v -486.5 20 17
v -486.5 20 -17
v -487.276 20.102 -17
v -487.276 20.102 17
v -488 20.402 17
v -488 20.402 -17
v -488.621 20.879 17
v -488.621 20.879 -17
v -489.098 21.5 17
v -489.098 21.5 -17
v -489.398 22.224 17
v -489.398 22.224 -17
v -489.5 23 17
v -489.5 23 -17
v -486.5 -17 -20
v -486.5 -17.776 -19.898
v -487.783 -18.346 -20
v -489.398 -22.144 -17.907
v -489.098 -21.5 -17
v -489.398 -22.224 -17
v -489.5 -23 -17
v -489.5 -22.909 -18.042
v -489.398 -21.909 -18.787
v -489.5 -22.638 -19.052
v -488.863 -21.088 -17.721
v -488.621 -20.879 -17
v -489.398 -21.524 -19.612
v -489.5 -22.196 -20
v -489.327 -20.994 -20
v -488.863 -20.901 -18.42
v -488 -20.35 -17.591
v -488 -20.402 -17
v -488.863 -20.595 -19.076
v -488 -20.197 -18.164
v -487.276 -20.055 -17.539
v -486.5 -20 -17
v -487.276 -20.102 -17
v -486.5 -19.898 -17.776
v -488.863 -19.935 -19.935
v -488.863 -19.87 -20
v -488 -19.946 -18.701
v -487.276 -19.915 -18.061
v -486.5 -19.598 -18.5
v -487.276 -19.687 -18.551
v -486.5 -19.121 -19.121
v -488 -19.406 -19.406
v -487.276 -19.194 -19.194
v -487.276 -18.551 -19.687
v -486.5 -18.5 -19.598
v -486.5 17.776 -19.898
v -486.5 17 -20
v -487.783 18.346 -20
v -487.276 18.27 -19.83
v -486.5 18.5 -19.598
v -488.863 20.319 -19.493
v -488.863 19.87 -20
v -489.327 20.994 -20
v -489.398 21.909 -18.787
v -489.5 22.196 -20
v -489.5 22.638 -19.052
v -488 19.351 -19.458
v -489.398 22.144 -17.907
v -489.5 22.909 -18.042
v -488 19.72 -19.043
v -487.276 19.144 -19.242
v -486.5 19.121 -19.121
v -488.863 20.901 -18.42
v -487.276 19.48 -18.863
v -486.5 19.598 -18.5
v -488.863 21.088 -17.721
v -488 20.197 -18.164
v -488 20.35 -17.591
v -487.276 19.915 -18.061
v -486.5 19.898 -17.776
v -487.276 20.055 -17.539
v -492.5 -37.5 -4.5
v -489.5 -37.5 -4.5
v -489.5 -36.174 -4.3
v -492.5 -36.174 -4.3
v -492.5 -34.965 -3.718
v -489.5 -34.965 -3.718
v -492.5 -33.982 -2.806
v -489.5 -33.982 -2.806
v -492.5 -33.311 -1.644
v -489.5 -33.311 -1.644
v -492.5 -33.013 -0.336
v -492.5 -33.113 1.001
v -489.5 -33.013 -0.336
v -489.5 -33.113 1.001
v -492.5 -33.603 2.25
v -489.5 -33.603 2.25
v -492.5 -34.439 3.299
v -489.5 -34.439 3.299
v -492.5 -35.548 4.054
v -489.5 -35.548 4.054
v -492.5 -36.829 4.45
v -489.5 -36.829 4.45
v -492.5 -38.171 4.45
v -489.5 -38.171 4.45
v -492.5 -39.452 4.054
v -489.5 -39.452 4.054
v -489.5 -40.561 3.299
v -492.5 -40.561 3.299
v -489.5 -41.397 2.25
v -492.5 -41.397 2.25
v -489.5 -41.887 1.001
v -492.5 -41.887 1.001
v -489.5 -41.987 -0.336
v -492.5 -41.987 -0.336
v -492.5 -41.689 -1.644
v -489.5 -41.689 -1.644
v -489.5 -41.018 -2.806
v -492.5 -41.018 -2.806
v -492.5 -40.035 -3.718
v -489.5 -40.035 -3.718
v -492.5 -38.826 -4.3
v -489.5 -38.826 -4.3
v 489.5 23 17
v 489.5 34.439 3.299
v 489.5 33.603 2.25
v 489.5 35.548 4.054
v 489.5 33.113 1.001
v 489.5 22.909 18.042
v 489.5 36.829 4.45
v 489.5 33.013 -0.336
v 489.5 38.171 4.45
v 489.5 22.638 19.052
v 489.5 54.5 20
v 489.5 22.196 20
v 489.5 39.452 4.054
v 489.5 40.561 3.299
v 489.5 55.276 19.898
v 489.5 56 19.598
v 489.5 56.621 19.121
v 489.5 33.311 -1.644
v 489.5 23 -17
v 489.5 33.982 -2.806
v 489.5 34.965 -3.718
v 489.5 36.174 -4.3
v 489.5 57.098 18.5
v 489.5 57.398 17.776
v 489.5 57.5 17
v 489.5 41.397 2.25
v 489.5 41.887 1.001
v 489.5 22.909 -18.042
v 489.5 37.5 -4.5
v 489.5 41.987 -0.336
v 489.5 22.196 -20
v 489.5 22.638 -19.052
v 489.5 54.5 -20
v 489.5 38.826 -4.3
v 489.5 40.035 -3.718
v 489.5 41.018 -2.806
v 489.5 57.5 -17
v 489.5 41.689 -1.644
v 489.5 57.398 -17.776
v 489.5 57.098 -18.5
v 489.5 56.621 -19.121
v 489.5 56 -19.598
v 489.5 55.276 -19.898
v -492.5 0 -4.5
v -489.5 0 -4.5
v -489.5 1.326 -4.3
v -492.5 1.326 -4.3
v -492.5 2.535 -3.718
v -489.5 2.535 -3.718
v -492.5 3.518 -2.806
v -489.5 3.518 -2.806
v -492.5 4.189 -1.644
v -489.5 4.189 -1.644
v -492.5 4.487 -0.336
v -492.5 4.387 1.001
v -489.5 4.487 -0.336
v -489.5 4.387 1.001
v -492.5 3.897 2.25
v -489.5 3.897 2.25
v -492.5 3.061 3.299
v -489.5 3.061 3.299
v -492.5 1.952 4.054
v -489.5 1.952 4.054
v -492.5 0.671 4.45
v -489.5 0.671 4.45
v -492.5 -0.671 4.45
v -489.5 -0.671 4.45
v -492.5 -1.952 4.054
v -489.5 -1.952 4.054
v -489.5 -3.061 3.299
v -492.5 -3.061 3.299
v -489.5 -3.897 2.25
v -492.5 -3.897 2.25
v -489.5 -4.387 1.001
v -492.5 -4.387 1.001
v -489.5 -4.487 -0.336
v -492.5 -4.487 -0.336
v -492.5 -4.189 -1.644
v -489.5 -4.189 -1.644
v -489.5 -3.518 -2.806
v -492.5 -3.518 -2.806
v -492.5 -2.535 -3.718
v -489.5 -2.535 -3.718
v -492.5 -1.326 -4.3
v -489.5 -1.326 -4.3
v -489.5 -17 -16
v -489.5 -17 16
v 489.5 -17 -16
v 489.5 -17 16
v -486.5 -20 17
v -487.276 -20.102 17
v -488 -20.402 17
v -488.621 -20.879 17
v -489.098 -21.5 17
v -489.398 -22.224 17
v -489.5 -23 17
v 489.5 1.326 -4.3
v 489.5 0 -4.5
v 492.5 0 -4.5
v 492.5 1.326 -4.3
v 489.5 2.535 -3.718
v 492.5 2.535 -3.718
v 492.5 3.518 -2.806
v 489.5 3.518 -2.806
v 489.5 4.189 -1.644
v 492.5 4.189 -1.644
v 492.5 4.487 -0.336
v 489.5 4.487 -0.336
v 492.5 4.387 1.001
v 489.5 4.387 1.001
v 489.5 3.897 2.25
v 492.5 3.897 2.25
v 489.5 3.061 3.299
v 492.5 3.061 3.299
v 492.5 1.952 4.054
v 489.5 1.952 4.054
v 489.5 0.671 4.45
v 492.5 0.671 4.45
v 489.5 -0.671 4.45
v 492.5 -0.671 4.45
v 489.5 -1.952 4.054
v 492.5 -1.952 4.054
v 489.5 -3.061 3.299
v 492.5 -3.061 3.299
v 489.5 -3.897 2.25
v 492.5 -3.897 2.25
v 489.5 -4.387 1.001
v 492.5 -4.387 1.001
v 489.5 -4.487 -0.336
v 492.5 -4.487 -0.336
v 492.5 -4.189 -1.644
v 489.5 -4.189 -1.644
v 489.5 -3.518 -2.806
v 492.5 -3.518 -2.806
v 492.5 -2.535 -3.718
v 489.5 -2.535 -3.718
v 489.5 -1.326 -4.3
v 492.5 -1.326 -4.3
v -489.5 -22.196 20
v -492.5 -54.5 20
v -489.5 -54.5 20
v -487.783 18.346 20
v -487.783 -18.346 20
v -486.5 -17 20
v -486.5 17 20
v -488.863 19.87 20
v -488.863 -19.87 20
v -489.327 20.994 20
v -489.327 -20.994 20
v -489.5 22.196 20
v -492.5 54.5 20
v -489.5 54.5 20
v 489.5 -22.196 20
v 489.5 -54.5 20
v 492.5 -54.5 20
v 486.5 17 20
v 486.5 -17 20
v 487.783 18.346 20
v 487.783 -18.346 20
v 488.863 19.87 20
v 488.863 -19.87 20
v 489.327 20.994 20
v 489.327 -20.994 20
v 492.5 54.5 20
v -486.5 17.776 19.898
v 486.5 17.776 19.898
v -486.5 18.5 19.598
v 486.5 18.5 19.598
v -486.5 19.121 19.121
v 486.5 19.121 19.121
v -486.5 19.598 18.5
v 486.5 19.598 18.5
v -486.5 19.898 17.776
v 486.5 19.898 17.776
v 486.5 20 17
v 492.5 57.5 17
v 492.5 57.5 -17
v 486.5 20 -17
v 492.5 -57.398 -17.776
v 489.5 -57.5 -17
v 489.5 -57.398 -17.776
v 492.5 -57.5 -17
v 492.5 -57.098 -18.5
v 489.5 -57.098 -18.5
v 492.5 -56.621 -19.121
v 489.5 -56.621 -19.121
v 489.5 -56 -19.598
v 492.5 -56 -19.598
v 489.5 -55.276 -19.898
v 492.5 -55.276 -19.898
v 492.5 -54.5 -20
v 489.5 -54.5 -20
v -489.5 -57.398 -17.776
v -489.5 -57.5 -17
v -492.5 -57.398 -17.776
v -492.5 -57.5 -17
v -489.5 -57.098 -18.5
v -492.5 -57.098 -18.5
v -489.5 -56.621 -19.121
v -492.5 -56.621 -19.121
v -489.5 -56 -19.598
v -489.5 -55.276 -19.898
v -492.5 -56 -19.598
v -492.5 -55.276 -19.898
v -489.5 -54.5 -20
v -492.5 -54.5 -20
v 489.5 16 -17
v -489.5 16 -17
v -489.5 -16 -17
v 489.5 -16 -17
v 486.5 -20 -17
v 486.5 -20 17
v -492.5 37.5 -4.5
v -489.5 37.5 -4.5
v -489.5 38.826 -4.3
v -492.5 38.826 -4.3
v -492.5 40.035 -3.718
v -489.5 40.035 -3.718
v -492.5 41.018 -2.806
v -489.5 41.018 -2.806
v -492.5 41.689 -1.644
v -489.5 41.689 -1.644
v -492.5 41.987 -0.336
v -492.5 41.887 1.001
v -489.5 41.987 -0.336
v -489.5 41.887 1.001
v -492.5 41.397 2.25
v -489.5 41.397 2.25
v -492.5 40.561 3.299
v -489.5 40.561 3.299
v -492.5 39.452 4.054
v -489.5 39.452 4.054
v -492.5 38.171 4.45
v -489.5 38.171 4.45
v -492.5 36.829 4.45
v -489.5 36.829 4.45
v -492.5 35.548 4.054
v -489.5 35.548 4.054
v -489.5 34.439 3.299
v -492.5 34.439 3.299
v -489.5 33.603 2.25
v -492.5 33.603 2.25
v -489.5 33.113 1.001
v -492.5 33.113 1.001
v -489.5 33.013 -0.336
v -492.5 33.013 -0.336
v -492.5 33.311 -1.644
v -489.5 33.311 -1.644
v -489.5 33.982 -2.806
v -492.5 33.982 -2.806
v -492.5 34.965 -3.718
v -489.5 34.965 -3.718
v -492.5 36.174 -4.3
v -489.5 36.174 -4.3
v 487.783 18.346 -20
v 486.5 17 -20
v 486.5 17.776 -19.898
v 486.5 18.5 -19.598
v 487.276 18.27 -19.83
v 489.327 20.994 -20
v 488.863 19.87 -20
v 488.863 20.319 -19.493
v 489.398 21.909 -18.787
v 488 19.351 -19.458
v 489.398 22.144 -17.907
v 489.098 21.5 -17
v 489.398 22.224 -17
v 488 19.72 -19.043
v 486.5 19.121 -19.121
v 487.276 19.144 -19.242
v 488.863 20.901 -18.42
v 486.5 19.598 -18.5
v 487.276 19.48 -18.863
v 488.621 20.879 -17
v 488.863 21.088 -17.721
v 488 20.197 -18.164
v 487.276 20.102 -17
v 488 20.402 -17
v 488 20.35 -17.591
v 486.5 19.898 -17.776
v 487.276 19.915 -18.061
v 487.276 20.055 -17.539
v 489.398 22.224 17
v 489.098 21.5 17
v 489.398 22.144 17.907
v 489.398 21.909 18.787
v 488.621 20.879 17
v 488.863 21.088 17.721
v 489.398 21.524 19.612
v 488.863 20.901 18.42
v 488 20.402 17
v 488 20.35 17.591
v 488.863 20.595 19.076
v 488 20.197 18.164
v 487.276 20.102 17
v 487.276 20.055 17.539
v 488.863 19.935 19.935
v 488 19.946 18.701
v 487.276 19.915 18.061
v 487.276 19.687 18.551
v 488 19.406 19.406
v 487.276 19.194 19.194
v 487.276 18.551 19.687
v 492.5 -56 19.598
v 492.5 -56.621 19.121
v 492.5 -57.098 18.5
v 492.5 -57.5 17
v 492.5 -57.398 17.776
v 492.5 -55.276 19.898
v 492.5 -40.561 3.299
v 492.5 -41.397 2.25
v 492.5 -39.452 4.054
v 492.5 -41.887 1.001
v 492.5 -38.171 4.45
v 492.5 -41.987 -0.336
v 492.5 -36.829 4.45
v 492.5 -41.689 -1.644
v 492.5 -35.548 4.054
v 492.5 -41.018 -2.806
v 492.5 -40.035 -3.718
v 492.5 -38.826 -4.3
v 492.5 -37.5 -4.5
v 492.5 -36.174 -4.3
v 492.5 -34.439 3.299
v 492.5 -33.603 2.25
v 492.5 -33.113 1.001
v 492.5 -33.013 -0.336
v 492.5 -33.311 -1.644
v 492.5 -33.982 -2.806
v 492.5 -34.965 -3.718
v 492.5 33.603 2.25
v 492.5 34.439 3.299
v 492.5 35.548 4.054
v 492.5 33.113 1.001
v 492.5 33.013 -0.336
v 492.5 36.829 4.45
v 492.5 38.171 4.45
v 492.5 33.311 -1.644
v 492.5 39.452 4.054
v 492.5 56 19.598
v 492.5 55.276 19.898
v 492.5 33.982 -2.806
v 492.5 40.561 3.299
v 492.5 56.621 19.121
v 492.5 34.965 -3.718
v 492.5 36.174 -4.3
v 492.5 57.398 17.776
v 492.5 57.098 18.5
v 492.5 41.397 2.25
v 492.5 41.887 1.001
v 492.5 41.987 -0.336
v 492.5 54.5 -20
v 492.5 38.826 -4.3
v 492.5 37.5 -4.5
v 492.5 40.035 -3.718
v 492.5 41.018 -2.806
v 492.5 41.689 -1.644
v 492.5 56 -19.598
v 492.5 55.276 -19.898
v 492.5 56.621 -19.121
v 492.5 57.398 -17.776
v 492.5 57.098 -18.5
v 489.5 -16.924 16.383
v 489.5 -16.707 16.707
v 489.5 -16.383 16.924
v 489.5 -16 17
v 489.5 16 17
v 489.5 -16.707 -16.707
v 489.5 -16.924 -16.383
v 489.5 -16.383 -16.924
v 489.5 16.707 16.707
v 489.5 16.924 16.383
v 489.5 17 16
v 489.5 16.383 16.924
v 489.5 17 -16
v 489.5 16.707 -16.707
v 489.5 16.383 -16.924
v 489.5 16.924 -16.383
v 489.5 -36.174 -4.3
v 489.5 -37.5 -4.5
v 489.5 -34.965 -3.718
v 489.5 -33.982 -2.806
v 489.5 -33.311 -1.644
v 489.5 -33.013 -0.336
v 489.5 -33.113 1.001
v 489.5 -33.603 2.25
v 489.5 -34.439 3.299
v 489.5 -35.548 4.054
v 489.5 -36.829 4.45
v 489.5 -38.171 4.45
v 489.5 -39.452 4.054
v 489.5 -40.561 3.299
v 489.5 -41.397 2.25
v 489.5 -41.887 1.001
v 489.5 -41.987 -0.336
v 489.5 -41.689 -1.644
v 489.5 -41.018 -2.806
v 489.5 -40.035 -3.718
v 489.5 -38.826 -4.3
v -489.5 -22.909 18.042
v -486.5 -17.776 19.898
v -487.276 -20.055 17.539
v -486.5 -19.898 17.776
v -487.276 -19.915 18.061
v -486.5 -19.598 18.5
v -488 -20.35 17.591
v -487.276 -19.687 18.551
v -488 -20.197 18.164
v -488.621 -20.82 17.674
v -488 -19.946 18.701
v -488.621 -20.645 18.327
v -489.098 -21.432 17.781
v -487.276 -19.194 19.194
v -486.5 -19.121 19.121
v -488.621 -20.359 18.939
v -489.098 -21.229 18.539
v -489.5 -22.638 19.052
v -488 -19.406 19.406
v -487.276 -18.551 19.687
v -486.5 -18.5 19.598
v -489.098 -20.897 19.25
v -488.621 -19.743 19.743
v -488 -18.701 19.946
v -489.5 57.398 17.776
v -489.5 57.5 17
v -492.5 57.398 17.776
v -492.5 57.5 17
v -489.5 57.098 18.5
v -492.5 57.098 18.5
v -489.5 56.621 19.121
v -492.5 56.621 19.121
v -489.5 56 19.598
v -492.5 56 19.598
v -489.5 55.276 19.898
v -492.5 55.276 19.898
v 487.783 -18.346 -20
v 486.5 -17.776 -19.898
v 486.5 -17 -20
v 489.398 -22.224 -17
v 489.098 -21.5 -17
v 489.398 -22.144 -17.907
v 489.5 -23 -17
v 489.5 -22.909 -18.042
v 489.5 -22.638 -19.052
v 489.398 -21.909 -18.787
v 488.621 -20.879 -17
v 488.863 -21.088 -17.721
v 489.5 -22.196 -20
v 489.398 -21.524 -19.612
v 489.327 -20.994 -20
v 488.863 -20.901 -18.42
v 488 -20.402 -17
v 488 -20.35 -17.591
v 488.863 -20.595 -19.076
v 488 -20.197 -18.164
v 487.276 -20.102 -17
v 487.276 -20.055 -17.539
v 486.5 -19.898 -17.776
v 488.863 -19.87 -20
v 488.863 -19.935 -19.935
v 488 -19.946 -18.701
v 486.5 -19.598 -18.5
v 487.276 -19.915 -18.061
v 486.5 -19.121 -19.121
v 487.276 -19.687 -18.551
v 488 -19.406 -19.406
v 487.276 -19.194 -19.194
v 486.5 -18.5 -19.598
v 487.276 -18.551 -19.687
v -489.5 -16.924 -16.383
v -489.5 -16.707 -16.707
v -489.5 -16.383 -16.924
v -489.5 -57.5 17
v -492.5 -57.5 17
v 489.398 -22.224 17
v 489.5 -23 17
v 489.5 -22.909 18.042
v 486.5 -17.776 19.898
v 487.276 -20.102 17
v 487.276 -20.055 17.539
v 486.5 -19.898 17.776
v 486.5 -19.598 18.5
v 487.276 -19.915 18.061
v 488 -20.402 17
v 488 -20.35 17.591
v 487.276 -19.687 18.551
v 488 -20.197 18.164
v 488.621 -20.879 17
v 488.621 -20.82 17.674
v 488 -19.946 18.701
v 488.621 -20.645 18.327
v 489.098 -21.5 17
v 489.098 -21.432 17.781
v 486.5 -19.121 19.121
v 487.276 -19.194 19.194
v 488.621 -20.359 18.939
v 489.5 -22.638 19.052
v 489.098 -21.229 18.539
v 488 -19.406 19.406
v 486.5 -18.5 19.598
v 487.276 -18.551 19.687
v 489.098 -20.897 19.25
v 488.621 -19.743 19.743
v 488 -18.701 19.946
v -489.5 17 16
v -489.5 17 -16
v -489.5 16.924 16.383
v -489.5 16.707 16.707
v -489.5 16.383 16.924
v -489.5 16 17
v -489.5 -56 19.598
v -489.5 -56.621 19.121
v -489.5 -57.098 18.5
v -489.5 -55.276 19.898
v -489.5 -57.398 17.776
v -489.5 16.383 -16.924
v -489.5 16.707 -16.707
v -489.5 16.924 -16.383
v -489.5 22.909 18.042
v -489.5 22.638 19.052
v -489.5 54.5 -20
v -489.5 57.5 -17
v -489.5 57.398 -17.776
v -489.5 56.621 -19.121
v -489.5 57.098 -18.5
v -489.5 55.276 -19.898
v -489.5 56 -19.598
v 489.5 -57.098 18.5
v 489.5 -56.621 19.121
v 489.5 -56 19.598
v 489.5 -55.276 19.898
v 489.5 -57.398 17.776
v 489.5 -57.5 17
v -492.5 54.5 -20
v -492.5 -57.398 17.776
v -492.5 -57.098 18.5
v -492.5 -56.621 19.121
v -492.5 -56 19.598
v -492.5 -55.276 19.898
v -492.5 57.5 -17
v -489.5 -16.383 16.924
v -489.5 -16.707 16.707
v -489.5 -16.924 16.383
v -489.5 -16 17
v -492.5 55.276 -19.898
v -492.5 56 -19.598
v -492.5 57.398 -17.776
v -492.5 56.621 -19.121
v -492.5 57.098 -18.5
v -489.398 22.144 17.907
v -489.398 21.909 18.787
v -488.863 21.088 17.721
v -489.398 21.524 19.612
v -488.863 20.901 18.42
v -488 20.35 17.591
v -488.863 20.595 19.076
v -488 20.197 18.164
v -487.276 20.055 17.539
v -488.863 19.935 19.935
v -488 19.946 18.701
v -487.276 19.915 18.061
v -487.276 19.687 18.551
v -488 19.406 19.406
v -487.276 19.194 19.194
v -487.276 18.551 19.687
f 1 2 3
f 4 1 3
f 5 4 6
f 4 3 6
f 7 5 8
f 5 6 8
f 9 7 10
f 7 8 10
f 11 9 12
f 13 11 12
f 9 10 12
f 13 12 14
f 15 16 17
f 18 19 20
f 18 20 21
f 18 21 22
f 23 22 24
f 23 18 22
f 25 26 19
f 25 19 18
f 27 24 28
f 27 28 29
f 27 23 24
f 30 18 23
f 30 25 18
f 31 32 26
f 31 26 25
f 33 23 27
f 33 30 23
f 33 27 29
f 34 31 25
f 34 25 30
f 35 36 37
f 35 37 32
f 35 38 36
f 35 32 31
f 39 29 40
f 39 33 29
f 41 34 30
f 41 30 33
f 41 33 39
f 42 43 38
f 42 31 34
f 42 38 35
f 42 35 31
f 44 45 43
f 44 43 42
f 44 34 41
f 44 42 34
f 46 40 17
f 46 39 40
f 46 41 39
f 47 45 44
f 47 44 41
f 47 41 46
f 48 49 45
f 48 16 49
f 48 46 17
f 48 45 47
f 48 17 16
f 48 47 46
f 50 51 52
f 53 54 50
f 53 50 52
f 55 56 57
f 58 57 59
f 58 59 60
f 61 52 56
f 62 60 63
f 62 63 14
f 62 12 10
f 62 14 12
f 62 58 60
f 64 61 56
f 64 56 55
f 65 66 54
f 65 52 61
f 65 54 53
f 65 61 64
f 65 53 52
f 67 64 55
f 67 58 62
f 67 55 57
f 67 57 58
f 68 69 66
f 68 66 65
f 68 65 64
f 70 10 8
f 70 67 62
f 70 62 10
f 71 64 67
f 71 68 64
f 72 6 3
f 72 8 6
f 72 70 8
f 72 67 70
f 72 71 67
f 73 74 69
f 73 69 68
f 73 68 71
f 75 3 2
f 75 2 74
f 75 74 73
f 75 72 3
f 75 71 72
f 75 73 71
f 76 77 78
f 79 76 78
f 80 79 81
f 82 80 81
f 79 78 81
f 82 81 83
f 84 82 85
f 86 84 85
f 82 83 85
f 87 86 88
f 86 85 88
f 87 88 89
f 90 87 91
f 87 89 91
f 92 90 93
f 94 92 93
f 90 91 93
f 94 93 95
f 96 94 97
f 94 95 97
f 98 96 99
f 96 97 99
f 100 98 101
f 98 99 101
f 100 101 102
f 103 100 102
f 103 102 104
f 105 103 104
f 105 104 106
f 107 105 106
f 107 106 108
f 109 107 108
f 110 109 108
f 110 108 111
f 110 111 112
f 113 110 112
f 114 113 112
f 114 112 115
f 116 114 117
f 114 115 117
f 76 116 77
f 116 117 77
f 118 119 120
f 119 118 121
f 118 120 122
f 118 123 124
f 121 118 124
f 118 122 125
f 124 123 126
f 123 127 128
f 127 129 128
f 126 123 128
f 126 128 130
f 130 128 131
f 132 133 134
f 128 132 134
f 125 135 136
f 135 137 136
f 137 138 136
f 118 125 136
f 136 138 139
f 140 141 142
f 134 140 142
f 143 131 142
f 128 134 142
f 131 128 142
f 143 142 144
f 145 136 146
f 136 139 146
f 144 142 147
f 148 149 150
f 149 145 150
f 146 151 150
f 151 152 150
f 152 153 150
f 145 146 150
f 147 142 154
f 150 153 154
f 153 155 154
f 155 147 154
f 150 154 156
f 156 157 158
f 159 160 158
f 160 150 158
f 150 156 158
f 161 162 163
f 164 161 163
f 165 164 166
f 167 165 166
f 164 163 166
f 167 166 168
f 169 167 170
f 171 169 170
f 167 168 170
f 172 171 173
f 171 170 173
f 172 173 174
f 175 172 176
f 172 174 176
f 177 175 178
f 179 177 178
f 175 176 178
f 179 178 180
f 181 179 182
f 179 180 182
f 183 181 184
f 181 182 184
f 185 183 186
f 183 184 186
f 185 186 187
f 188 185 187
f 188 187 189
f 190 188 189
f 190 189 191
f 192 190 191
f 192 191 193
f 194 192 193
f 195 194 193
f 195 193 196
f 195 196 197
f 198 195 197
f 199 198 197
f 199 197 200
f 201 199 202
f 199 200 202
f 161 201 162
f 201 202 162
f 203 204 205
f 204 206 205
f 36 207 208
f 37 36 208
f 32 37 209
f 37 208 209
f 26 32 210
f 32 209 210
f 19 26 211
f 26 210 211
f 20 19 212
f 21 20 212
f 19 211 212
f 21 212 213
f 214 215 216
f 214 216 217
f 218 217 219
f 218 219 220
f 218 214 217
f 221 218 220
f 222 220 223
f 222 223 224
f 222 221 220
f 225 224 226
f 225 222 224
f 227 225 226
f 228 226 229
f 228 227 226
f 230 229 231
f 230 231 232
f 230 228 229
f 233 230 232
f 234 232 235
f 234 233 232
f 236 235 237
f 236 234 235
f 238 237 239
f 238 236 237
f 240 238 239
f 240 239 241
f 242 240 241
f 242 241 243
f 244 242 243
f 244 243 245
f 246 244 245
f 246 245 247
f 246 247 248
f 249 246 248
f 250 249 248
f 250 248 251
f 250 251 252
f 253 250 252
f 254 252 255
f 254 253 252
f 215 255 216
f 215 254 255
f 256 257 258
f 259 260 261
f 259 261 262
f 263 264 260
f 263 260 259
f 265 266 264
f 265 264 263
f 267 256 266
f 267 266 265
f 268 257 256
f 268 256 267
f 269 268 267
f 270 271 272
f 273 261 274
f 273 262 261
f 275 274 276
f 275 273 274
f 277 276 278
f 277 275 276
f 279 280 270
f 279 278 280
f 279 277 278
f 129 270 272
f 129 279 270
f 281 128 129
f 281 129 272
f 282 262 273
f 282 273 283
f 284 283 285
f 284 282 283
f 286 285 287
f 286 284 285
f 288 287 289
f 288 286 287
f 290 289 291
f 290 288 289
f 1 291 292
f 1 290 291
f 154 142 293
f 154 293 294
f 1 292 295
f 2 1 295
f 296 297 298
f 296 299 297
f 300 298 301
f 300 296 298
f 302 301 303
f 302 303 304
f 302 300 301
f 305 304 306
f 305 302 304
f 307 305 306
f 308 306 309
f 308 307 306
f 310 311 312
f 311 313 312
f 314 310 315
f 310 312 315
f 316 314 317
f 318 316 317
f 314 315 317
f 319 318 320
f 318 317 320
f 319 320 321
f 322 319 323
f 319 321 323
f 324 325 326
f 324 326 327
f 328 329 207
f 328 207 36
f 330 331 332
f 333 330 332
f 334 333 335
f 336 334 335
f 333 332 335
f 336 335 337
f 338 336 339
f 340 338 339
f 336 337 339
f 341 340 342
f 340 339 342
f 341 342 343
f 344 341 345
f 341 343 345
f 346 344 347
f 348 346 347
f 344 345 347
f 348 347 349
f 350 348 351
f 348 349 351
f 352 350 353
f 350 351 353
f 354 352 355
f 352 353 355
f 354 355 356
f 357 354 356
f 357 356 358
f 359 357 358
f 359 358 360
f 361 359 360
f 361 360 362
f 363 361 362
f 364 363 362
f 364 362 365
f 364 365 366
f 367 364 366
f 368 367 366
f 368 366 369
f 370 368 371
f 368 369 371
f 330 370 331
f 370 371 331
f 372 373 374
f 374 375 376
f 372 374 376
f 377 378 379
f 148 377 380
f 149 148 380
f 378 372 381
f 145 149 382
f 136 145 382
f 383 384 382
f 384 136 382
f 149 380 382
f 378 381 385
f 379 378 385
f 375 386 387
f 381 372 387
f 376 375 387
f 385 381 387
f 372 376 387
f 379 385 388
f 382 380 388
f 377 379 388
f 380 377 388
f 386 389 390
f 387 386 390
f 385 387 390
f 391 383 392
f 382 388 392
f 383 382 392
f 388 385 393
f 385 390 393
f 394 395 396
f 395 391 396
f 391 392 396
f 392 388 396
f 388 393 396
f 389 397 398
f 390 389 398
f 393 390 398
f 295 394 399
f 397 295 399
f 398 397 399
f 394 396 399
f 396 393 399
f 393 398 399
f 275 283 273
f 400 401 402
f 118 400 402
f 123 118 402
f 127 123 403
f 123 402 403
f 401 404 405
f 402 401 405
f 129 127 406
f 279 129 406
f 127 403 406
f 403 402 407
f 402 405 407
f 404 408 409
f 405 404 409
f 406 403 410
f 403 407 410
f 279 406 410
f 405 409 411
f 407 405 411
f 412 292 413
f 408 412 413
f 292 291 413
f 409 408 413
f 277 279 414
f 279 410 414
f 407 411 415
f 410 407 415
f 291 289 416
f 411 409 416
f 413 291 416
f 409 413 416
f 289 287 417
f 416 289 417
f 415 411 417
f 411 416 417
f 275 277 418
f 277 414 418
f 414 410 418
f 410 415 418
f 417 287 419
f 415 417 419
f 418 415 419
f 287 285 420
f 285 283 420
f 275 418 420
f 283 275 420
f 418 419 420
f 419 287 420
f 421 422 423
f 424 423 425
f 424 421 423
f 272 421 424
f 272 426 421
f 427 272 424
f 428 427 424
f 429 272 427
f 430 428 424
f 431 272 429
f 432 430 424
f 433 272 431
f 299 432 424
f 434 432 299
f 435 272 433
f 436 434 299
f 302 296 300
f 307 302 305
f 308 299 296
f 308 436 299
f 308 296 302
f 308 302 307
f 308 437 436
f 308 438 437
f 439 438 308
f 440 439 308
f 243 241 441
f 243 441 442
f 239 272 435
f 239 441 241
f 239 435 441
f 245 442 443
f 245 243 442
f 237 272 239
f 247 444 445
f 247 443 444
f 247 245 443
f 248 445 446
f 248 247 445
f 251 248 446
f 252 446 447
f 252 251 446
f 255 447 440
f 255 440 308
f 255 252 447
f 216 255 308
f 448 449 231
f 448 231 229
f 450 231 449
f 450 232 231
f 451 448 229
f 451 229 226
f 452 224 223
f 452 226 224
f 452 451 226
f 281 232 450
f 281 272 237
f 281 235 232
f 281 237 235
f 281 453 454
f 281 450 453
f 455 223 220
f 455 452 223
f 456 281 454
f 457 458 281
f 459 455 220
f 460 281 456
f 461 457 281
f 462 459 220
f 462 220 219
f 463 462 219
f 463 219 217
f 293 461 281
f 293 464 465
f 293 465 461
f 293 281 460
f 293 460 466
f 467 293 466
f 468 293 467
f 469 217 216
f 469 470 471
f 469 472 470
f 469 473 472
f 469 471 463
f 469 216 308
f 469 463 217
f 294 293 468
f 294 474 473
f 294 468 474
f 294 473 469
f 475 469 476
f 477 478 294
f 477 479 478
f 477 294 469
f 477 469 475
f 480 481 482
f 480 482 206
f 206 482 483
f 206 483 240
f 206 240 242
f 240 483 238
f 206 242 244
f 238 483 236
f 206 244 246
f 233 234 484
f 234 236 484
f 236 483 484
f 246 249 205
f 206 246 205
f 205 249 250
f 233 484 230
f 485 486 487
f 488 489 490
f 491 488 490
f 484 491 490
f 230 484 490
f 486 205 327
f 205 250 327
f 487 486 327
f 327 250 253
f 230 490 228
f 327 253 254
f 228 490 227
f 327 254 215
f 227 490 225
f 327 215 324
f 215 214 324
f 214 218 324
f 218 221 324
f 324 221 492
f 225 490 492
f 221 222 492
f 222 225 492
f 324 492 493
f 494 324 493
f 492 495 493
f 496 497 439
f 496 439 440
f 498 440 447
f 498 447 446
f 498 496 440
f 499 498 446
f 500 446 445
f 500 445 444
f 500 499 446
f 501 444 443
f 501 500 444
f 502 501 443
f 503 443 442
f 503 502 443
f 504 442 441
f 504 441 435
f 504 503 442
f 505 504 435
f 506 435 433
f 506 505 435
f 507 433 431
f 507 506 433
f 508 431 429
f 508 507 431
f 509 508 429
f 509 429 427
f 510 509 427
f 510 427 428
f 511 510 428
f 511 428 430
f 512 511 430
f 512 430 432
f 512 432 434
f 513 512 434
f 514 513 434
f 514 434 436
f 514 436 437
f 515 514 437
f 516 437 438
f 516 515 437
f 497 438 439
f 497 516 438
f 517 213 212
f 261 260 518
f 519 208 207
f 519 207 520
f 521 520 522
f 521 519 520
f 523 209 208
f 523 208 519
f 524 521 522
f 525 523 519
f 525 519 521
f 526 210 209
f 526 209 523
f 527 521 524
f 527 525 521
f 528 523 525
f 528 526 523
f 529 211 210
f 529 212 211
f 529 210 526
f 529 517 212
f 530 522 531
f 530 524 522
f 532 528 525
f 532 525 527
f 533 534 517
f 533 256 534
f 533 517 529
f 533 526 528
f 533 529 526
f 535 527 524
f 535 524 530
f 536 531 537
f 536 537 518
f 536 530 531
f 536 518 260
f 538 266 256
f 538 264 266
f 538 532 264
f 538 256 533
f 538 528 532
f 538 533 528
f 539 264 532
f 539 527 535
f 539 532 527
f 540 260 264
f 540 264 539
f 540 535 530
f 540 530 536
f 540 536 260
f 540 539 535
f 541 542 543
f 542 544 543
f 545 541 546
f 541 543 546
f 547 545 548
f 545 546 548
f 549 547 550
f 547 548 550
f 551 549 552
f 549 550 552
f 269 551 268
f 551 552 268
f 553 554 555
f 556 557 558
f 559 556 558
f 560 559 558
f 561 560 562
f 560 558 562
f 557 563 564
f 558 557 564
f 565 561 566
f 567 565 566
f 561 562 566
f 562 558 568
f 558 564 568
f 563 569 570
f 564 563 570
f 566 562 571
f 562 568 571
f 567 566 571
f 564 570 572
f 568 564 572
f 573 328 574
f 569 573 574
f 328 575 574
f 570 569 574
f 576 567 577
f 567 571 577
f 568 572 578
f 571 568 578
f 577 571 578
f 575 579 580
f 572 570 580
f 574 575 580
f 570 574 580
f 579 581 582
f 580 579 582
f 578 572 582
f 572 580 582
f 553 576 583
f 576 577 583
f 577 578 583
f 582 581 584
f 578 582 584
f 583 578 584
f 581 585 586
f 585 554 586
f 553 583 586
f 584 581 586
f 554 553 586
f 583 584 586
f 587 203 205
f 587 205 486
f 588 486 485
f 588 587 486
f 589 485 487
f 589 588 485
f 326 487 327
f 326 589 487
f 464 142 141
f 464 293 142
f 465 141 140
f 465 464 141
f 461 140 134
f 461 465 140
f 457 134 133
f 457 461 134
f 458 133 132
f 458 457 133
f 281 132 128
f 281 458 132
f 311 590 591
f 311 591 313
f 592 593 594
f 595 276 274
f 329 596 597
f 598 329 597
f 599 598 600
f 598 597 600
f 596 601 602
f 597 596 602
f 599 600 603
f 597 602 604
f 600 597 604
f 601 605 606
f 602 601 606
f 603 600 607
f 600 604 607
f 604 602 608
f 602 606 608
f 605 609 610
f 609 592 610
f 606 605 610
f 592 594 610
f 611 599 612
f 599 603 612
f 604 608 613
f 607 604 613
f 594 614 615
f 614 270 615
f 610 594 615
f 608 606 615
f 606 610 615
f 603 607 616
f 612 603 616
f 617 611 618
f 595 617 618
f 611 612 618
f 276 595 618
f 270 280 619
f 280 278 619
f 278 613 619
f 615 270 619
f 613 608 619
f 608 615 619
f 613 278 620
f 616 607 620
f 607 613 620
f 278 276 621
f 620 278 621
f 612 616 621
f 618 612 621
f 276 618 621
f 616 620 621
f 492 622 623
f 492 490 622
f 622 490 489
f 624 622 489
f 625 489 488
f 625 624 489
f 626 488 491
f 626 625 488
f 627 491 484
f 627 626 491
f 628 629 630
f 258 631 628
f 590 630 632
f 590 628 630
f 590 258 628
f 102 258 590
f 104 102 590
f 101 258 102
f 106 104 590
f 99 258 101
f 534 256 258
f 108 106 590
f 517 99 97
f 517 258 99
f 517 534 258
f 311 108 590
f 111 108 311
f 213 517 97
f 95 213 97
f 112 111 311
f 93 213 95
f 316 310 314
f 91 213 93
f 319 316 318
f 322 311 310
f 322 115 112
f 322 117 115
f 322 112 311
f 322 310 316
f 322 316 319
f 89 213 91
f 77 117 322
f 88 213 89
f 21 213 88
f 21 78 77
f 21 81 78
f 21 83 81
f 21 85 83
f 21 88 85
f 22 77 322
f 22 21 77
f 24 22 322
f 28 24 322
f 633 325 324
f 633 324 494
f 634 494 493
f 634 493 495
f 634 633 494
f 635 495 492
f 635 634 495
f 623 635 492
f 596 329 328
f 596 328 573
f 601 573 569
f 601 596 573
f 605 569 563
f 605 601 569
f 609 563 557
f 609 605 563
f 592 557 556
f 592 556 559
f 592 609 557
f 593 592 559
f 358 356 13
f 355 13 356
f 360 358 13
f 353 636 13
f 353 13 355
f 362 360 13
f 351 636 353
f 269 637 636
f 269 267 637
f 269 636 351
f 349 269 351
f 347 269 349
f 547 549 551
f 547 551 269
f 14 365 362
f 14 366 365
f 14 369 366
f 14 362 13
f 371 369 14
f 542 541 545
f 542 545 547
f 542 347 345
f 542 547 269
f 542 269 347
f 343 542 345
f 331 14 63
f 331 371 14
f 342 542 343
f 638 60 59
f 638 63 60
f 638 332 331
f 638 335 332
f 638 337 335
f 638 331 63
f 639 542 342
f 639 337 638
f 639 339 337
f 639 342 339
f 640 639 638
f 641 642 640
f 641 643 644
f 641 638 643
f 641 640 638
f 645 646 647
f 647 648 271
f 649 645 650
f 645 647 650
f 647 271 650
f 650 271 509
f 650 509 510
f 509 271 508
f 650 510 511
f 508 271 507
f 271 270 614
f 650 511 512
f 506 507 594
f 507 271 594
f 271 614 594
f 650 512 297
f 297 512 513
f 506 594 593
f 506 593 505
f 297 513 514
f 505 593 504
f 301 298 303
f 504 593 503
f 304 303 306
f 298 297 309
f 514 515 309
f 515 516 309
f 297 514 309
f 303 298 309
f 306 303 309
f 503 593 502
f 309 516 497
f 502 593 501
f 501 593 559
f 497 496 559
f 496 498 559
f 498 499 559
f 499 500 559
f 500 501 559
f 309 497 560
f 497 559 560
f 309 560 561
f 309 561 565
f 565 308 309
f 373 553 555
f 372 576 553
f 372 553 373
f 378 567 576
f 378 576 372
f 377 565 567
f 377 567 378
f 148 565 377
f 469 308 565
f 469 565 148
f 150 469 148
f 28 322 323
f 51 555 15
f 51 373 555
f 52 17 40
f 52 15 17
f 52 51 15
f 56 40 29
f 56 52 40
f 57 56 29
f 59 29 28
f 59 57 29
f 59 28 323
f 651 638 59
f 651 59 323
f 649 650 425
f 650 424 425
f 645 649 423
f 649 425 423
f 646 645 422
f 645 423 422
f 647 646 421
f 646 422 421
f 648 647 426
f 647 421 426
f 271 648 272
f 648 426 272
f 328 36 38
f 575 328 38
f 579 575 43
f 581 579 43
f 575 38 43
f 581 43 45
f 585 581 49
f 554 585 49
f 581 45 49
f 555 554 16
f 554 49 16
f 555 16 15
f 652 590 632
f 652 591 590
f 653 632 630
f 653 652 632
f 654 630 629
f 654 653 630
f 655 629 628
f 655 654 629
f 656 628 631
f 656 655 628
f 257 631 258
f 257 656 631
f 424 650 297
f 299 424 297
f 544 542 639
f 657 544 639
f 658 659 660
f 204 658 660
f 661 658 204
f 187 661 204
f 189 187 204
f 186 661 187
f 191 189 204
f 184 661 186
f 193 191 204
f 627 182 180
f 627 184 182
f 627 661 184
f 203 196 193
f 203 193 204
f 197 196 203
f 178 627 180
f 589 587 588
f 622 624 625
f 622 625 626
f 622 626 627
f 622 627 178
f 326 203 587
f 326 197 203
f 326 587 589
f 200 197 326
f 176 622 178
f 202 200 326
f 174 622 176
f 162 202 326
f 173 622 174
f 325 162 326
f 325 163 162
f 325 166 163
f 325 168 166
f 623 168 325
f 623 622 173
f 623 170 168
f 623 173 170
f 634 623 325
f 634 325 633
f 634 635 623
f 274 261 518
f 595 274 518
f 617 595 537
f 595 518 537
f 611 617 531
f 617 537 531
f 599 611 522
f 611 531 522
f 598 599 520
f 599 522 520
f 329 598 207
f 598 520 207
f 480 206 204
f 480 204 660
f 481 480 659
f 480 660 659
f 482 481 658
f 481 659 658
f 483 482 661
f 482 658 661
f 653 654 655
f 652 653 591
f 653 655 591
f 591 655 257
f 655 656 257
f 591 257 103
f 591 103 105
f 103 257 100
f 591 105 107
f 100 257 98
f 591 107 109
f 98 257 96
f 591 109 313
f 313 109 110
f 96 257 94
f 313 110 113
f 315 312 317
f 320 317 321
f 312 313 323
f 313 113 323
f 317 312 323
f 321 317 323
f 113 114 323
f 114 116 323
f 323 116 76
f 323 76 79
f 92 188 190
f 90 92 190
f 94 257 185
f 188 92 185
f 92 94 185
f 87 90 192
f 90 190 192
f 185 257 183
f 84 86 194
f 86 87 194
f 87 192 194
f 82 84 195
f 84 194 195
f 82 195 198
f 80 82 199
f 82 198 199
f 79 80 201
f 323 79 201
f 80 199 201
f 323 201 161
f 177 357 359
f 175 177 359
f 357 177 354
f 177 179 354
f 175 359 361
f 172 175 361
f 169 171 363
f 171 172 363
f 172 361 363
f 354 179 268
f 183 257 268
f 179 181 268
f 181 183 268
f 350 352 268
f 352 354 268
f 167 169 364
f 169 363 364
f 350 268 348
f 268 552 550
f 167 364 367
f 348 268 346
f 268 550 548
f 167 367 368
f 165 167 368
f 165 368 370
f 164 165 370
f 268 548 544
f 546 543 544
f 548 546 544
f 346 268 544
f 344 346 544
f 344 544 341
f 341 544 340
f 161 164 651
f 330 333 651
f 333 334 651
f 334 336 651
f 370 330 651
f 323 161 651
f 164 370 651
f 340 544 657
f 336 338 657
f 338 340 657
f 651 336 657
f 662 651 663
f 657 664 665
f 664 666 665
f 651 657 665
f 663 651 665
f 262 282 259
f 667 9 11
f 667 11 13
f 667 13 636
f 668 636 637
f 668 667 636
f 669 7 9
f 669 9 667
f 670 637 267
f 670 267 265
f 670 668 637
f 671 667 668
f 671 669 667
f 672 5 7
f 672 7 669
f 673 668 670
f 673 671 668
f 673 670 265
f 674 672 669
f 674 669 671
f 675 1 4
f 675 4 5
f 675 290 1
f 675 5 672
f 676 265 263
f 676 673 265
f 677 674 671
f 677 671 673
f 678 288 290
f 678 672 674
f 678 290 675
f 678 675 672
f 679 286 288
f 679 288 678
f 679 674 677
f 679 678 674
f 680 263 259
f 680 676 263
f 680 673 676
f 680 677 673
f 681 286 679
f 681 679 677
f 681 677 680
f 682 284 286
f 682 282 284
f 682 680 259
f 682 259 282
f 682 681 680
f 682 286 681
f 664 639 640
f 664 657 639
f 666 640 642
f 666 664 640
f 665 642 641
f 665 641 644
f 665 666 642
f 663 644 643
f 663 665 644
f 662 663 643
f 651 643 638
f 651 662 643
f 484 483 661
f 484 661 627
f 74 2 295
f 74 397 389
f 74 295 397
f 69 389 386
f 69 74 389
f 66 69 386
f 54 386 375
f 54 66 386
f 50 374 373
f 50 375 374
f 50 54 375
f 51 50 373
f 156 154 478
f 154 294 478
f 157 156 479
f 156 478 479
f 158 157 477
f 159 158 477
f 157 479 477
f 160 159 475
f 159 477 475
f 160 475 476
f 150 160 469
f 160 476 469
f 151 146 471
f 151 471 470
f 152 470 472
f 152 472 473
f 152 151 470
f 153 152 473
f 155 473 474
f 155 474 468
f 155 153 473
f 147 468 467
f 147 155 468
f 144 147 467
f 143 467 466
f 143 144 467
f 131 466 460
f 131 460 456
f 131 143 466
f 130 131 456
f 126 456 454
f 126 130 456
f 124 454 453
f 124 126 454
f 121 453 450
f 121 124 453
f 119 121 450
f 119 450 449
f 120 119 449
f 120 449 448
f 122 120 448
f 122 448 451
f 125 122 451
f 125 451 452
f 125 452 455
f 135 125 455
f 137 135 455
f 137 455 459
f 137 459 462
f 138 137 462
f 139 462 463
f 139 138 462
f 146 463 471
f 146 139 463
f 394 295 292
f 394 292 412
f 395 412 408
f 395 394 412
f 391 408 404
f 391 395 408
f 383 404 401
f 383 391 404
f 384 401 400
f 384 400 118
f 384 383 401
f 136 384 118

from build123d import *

# Parameters (mm, degrees)
SKETCH1_W           = 40
SKETCH1_H           = 40
SKETCH1_W_2         = 34
SKETCH1_H_2         = 34
BOSS_EXTRUDE1_DEPTH = 489.5
FILLET1_R           = 1
FILLET2_R           = 3
SKETCH2_W           = 40
SKETCH2_H           = 115
SKETCH2_R           = 4.5
BOSS_EXTRUDE2_DEPTH = 3
FILLET3_R           = 3
FILLET4_R           = 3


with BuildPart() as part:
    # Sketch1 → Boss-Extrude1 (new body)
    with BuildSketch(Plane(origin=(0, 0, 0), x_dir=(0, 0, -1), z_dir=(1, 0, 0))):
        Rectangle(SKETCH1_W, SKETCH1_H)
        Rectangle(SKETCH1_W_2, SKETCH1_H_2, mode=Mode.SUBTRACT)
    extrude(amount=BOSS_EXTRUDE1_DEPTH)

    # Fillet1
    fillet1_edges = [part.edges().sort_by_distance(p)[0] for p in [
        (244.75, -17, -17),
        (244.75, 17, -17),
        (244.75, 17, 17),
        (244.75, -17, 17),
    ]]
    fillet(fillet1_edges, radius=FILLET1_R)

    # Fillet2
    fillet2_edges = [part.edges().sort_by_distance(p)[0] for p in [
        (244.75, -20, -20),
        (244.75, -20, 20),
        (244.75, 20, 20),
        (244.75, 20, -20),
    ]]
    fillet(fillet2_edges, radius=FILLET2_R)

    # Sketch2 → Boss-Extrude2 (add)
    with BuildSketch(Plane(origin=(489.5, 0, 0), x_dir=(0, 0, -1), z_dir=(1, 0, 0))):
        Rectangle(SKETCH2_W, SKETCH2_H)
        Circle(SKETCH2_R, mode=Mode.SUBTRACT)
        with Locations((0, -37.5)):
            Circle(SKETCH2_R, mode=Mode.SUBTRACT)
        with Locations((0, 37.5)):
            Circle(SKETCH2_R, mode=Mode.SUBTRACT)
    extrude(amount=BOSS_EXTRUDE2_DEPTH)

    # Fillet3
    # the kernel refuses this fillet: 3 mm, written as the material it adds along each edge
    with BuildSketch(Plane(origin=(489.5, -20, 17), x_dir=(0, -1, 0), z_dir=(0, 0, -1)), Plane(origin=(489.5, 20, -17), x_dir=(0, 1, 0), z_dir=(0, 0, 1))) as fillet3_piece_1:
        with BuildLine():
            CenterArc((FILLET3_R, FILLET3_R), FILLET3_R, 180, 90)
            Line((0, FILLET3_R), (0, 0))
            Line((0, 0), (FILLET3_R, 0))
        make_face()
    extrude(amount=34)
    with BuildSketch(Plane(origin=(489.5, 17, 17), x_dir=(0, 1, 0), z_dir=(0, 0, -1))) as fillet3_piece_2_section:
        with BuildLine():
            CenterArc((3 + FILLET3_R, -FILLET3_R), FILLET3_R, 90, 90)
            Line((3, -FILLET3_R), (3, 0))
            Line((3, 0), (3 + FILLET3_R, 0))
        make_face()
    fillet3_piece_2 = revolve(axis=Axis((489.5, 17, 17), (1, 0, 0)), revolution_arc=233.296989237, mode=Mode.PRIVATE)
    fillet3_piece_2 = split(fillet3_piece_2, bisect_by=Plane(origin=(488.998099396, 20.659325751, 20), z_dir=(0, 0, -1)), keep=Keep.TOP, mode=Mode.PRIVATE)
    fillet3_piece_2 = split(fillet3_piece_2, bisect_by=Plane(origin=(488.998099396, 20.659325751, 17), z_dir=(0, 0, 1)), keep=Keep.TOP, mode=Mode.PRIVATE)
    add(fillet3_piece_2)
    with BuildSketch(Plane(origin=(489.5, 17, -17), x_dir=(0, -0.5976672776328276, 0.8017442392976482), z_dir=(0, 0.8017442392976482, 0.5976672776328276))) as fillet3_piece_3_section:
        with BuildLine():
            CenterArc((3 + FILLET3_R, -FILLET3_R), FILLET3_R, 90, 90)
            Line((3, -FILLET3_R), (3, 0))
            Line((3, 0), (3 + FILLET3_R, 0))
        make_face()
    fillet3_piece_3 = revolve(axis=Axis((489.5, 17, -17), (1, 0, 0)), revolution_arc=233.296989237, mode=Mode.PRIVATE)
    fillet3_piece_3 = split(fillet3_piece_3, bisect_by=Plane(origin=(488.565115083, 19.249816872, -20), z_dir=(0, 0, 1)), keep=Keep.TOP, mode=Mode.PRIVATE)
    fillet3_piece_3 = split(fillet3_piece_3, bisect_by=Plane(origin=(488.565115083, 19.249816872, -17), z_dir=(0, 0, -1)), keep=Keep.TOP, mode=Mode.PRIVATE)
    add(fillet3_piece_3)
    with BuildSketch(Plane(origin=(489.5, -17, -17), x_dir=(0, -1, 0), z_dir=(0, 0, 1))) as fillet3_piece_4_section:
        with BuildLine():
            CenterArc((3 + FILLET3_R, -FILLET3_R), FILLET3_R, 90, 90)
            Line((3, -FILLET3_R), (3, 0))
            Line((3, 0), (3 + FILLET3_R, 0))
        make_face()
    fillet3_piece_4 = revolve(axis=Axis((489.5, -17, -17), (1, 0, 0)), revolution_arc=233.296989237, mode=Mode.PRIVATE)
    fillet3_piece_4 = split(fillet3_piece_4, bisect_by=Plane(origin=(488.998099396, -20.659325751, -20), z_dir=(0, 0, 1)), keep=Keep.TOP, mode=Mode.PRIVATE)
    fillet3_piece_4 = split(fillet3_piece_4, bisect_by=Plane(origin=(488.998099396, -20.659325751, -17), z_dir=(0, 0, -1)), keep=Keep.TOP, mode=Mode.PRIVATE)
    add(fillet3_piece_4)
    with BuildSketch(Plane(origin=(489.5, -17, 17), x_dir=(0, -1, 0), z_dir=(0, 0, -1))) as fillet3_piece_5_section:
        with BuildLine():
            CenterArc((3 + FILLET3_R, FILLET3_R), FILLET3_R, 180, 90)
            Line((3, FILLET3_R), (3, 0))
            Line((3, 0), (3 + FILLET3_R, 0))
        make_face()
    fillet3_piece_5 = revolve(axis=Axis((489.5, -17, 17), (-1, 0, 0)), revolution_arc=233.296989237, mode=Mode.PRIVATE)
    fillet3_piece_5 = split(fillet3_piece_5, bisect_by=Plane(origin=(488.998099366, -20.659325736, 20), z_dir=(0, 0, -1)), keep=Keep.TOP, mode=Mode.PRIVATE)
    fillet3_piece_5 = split(fillet3_piece_5, bisect_by=Plane(origin=(488.998099366, -20.659325736, 17), z_dir=(0, 0, 1)), keep=Keep.TOP, mode=Mode.PRIVATE)
    add(fillet3_piece_5)

    # Fillet4
    fillet4_edges = [part.edges().sort_by_distance(p)[0] for p in [
        (491, -57.5, -20),
        (491, 57.5, -20),
        (491, 57.5, 20),
        (491, -57.5, 20),
    ]]
    fillet(fillet4_edges, radius=FILLET4_R)

    # Mirror1: part across plane


with BuildPart() as part_1:
    add(part.part)
    add(part.part.mirror(Plane(origin=(0, 0, 0), x_dir=(0, 0, 1), z_dir=(1, 0, 0))))


solid = part_1.part
